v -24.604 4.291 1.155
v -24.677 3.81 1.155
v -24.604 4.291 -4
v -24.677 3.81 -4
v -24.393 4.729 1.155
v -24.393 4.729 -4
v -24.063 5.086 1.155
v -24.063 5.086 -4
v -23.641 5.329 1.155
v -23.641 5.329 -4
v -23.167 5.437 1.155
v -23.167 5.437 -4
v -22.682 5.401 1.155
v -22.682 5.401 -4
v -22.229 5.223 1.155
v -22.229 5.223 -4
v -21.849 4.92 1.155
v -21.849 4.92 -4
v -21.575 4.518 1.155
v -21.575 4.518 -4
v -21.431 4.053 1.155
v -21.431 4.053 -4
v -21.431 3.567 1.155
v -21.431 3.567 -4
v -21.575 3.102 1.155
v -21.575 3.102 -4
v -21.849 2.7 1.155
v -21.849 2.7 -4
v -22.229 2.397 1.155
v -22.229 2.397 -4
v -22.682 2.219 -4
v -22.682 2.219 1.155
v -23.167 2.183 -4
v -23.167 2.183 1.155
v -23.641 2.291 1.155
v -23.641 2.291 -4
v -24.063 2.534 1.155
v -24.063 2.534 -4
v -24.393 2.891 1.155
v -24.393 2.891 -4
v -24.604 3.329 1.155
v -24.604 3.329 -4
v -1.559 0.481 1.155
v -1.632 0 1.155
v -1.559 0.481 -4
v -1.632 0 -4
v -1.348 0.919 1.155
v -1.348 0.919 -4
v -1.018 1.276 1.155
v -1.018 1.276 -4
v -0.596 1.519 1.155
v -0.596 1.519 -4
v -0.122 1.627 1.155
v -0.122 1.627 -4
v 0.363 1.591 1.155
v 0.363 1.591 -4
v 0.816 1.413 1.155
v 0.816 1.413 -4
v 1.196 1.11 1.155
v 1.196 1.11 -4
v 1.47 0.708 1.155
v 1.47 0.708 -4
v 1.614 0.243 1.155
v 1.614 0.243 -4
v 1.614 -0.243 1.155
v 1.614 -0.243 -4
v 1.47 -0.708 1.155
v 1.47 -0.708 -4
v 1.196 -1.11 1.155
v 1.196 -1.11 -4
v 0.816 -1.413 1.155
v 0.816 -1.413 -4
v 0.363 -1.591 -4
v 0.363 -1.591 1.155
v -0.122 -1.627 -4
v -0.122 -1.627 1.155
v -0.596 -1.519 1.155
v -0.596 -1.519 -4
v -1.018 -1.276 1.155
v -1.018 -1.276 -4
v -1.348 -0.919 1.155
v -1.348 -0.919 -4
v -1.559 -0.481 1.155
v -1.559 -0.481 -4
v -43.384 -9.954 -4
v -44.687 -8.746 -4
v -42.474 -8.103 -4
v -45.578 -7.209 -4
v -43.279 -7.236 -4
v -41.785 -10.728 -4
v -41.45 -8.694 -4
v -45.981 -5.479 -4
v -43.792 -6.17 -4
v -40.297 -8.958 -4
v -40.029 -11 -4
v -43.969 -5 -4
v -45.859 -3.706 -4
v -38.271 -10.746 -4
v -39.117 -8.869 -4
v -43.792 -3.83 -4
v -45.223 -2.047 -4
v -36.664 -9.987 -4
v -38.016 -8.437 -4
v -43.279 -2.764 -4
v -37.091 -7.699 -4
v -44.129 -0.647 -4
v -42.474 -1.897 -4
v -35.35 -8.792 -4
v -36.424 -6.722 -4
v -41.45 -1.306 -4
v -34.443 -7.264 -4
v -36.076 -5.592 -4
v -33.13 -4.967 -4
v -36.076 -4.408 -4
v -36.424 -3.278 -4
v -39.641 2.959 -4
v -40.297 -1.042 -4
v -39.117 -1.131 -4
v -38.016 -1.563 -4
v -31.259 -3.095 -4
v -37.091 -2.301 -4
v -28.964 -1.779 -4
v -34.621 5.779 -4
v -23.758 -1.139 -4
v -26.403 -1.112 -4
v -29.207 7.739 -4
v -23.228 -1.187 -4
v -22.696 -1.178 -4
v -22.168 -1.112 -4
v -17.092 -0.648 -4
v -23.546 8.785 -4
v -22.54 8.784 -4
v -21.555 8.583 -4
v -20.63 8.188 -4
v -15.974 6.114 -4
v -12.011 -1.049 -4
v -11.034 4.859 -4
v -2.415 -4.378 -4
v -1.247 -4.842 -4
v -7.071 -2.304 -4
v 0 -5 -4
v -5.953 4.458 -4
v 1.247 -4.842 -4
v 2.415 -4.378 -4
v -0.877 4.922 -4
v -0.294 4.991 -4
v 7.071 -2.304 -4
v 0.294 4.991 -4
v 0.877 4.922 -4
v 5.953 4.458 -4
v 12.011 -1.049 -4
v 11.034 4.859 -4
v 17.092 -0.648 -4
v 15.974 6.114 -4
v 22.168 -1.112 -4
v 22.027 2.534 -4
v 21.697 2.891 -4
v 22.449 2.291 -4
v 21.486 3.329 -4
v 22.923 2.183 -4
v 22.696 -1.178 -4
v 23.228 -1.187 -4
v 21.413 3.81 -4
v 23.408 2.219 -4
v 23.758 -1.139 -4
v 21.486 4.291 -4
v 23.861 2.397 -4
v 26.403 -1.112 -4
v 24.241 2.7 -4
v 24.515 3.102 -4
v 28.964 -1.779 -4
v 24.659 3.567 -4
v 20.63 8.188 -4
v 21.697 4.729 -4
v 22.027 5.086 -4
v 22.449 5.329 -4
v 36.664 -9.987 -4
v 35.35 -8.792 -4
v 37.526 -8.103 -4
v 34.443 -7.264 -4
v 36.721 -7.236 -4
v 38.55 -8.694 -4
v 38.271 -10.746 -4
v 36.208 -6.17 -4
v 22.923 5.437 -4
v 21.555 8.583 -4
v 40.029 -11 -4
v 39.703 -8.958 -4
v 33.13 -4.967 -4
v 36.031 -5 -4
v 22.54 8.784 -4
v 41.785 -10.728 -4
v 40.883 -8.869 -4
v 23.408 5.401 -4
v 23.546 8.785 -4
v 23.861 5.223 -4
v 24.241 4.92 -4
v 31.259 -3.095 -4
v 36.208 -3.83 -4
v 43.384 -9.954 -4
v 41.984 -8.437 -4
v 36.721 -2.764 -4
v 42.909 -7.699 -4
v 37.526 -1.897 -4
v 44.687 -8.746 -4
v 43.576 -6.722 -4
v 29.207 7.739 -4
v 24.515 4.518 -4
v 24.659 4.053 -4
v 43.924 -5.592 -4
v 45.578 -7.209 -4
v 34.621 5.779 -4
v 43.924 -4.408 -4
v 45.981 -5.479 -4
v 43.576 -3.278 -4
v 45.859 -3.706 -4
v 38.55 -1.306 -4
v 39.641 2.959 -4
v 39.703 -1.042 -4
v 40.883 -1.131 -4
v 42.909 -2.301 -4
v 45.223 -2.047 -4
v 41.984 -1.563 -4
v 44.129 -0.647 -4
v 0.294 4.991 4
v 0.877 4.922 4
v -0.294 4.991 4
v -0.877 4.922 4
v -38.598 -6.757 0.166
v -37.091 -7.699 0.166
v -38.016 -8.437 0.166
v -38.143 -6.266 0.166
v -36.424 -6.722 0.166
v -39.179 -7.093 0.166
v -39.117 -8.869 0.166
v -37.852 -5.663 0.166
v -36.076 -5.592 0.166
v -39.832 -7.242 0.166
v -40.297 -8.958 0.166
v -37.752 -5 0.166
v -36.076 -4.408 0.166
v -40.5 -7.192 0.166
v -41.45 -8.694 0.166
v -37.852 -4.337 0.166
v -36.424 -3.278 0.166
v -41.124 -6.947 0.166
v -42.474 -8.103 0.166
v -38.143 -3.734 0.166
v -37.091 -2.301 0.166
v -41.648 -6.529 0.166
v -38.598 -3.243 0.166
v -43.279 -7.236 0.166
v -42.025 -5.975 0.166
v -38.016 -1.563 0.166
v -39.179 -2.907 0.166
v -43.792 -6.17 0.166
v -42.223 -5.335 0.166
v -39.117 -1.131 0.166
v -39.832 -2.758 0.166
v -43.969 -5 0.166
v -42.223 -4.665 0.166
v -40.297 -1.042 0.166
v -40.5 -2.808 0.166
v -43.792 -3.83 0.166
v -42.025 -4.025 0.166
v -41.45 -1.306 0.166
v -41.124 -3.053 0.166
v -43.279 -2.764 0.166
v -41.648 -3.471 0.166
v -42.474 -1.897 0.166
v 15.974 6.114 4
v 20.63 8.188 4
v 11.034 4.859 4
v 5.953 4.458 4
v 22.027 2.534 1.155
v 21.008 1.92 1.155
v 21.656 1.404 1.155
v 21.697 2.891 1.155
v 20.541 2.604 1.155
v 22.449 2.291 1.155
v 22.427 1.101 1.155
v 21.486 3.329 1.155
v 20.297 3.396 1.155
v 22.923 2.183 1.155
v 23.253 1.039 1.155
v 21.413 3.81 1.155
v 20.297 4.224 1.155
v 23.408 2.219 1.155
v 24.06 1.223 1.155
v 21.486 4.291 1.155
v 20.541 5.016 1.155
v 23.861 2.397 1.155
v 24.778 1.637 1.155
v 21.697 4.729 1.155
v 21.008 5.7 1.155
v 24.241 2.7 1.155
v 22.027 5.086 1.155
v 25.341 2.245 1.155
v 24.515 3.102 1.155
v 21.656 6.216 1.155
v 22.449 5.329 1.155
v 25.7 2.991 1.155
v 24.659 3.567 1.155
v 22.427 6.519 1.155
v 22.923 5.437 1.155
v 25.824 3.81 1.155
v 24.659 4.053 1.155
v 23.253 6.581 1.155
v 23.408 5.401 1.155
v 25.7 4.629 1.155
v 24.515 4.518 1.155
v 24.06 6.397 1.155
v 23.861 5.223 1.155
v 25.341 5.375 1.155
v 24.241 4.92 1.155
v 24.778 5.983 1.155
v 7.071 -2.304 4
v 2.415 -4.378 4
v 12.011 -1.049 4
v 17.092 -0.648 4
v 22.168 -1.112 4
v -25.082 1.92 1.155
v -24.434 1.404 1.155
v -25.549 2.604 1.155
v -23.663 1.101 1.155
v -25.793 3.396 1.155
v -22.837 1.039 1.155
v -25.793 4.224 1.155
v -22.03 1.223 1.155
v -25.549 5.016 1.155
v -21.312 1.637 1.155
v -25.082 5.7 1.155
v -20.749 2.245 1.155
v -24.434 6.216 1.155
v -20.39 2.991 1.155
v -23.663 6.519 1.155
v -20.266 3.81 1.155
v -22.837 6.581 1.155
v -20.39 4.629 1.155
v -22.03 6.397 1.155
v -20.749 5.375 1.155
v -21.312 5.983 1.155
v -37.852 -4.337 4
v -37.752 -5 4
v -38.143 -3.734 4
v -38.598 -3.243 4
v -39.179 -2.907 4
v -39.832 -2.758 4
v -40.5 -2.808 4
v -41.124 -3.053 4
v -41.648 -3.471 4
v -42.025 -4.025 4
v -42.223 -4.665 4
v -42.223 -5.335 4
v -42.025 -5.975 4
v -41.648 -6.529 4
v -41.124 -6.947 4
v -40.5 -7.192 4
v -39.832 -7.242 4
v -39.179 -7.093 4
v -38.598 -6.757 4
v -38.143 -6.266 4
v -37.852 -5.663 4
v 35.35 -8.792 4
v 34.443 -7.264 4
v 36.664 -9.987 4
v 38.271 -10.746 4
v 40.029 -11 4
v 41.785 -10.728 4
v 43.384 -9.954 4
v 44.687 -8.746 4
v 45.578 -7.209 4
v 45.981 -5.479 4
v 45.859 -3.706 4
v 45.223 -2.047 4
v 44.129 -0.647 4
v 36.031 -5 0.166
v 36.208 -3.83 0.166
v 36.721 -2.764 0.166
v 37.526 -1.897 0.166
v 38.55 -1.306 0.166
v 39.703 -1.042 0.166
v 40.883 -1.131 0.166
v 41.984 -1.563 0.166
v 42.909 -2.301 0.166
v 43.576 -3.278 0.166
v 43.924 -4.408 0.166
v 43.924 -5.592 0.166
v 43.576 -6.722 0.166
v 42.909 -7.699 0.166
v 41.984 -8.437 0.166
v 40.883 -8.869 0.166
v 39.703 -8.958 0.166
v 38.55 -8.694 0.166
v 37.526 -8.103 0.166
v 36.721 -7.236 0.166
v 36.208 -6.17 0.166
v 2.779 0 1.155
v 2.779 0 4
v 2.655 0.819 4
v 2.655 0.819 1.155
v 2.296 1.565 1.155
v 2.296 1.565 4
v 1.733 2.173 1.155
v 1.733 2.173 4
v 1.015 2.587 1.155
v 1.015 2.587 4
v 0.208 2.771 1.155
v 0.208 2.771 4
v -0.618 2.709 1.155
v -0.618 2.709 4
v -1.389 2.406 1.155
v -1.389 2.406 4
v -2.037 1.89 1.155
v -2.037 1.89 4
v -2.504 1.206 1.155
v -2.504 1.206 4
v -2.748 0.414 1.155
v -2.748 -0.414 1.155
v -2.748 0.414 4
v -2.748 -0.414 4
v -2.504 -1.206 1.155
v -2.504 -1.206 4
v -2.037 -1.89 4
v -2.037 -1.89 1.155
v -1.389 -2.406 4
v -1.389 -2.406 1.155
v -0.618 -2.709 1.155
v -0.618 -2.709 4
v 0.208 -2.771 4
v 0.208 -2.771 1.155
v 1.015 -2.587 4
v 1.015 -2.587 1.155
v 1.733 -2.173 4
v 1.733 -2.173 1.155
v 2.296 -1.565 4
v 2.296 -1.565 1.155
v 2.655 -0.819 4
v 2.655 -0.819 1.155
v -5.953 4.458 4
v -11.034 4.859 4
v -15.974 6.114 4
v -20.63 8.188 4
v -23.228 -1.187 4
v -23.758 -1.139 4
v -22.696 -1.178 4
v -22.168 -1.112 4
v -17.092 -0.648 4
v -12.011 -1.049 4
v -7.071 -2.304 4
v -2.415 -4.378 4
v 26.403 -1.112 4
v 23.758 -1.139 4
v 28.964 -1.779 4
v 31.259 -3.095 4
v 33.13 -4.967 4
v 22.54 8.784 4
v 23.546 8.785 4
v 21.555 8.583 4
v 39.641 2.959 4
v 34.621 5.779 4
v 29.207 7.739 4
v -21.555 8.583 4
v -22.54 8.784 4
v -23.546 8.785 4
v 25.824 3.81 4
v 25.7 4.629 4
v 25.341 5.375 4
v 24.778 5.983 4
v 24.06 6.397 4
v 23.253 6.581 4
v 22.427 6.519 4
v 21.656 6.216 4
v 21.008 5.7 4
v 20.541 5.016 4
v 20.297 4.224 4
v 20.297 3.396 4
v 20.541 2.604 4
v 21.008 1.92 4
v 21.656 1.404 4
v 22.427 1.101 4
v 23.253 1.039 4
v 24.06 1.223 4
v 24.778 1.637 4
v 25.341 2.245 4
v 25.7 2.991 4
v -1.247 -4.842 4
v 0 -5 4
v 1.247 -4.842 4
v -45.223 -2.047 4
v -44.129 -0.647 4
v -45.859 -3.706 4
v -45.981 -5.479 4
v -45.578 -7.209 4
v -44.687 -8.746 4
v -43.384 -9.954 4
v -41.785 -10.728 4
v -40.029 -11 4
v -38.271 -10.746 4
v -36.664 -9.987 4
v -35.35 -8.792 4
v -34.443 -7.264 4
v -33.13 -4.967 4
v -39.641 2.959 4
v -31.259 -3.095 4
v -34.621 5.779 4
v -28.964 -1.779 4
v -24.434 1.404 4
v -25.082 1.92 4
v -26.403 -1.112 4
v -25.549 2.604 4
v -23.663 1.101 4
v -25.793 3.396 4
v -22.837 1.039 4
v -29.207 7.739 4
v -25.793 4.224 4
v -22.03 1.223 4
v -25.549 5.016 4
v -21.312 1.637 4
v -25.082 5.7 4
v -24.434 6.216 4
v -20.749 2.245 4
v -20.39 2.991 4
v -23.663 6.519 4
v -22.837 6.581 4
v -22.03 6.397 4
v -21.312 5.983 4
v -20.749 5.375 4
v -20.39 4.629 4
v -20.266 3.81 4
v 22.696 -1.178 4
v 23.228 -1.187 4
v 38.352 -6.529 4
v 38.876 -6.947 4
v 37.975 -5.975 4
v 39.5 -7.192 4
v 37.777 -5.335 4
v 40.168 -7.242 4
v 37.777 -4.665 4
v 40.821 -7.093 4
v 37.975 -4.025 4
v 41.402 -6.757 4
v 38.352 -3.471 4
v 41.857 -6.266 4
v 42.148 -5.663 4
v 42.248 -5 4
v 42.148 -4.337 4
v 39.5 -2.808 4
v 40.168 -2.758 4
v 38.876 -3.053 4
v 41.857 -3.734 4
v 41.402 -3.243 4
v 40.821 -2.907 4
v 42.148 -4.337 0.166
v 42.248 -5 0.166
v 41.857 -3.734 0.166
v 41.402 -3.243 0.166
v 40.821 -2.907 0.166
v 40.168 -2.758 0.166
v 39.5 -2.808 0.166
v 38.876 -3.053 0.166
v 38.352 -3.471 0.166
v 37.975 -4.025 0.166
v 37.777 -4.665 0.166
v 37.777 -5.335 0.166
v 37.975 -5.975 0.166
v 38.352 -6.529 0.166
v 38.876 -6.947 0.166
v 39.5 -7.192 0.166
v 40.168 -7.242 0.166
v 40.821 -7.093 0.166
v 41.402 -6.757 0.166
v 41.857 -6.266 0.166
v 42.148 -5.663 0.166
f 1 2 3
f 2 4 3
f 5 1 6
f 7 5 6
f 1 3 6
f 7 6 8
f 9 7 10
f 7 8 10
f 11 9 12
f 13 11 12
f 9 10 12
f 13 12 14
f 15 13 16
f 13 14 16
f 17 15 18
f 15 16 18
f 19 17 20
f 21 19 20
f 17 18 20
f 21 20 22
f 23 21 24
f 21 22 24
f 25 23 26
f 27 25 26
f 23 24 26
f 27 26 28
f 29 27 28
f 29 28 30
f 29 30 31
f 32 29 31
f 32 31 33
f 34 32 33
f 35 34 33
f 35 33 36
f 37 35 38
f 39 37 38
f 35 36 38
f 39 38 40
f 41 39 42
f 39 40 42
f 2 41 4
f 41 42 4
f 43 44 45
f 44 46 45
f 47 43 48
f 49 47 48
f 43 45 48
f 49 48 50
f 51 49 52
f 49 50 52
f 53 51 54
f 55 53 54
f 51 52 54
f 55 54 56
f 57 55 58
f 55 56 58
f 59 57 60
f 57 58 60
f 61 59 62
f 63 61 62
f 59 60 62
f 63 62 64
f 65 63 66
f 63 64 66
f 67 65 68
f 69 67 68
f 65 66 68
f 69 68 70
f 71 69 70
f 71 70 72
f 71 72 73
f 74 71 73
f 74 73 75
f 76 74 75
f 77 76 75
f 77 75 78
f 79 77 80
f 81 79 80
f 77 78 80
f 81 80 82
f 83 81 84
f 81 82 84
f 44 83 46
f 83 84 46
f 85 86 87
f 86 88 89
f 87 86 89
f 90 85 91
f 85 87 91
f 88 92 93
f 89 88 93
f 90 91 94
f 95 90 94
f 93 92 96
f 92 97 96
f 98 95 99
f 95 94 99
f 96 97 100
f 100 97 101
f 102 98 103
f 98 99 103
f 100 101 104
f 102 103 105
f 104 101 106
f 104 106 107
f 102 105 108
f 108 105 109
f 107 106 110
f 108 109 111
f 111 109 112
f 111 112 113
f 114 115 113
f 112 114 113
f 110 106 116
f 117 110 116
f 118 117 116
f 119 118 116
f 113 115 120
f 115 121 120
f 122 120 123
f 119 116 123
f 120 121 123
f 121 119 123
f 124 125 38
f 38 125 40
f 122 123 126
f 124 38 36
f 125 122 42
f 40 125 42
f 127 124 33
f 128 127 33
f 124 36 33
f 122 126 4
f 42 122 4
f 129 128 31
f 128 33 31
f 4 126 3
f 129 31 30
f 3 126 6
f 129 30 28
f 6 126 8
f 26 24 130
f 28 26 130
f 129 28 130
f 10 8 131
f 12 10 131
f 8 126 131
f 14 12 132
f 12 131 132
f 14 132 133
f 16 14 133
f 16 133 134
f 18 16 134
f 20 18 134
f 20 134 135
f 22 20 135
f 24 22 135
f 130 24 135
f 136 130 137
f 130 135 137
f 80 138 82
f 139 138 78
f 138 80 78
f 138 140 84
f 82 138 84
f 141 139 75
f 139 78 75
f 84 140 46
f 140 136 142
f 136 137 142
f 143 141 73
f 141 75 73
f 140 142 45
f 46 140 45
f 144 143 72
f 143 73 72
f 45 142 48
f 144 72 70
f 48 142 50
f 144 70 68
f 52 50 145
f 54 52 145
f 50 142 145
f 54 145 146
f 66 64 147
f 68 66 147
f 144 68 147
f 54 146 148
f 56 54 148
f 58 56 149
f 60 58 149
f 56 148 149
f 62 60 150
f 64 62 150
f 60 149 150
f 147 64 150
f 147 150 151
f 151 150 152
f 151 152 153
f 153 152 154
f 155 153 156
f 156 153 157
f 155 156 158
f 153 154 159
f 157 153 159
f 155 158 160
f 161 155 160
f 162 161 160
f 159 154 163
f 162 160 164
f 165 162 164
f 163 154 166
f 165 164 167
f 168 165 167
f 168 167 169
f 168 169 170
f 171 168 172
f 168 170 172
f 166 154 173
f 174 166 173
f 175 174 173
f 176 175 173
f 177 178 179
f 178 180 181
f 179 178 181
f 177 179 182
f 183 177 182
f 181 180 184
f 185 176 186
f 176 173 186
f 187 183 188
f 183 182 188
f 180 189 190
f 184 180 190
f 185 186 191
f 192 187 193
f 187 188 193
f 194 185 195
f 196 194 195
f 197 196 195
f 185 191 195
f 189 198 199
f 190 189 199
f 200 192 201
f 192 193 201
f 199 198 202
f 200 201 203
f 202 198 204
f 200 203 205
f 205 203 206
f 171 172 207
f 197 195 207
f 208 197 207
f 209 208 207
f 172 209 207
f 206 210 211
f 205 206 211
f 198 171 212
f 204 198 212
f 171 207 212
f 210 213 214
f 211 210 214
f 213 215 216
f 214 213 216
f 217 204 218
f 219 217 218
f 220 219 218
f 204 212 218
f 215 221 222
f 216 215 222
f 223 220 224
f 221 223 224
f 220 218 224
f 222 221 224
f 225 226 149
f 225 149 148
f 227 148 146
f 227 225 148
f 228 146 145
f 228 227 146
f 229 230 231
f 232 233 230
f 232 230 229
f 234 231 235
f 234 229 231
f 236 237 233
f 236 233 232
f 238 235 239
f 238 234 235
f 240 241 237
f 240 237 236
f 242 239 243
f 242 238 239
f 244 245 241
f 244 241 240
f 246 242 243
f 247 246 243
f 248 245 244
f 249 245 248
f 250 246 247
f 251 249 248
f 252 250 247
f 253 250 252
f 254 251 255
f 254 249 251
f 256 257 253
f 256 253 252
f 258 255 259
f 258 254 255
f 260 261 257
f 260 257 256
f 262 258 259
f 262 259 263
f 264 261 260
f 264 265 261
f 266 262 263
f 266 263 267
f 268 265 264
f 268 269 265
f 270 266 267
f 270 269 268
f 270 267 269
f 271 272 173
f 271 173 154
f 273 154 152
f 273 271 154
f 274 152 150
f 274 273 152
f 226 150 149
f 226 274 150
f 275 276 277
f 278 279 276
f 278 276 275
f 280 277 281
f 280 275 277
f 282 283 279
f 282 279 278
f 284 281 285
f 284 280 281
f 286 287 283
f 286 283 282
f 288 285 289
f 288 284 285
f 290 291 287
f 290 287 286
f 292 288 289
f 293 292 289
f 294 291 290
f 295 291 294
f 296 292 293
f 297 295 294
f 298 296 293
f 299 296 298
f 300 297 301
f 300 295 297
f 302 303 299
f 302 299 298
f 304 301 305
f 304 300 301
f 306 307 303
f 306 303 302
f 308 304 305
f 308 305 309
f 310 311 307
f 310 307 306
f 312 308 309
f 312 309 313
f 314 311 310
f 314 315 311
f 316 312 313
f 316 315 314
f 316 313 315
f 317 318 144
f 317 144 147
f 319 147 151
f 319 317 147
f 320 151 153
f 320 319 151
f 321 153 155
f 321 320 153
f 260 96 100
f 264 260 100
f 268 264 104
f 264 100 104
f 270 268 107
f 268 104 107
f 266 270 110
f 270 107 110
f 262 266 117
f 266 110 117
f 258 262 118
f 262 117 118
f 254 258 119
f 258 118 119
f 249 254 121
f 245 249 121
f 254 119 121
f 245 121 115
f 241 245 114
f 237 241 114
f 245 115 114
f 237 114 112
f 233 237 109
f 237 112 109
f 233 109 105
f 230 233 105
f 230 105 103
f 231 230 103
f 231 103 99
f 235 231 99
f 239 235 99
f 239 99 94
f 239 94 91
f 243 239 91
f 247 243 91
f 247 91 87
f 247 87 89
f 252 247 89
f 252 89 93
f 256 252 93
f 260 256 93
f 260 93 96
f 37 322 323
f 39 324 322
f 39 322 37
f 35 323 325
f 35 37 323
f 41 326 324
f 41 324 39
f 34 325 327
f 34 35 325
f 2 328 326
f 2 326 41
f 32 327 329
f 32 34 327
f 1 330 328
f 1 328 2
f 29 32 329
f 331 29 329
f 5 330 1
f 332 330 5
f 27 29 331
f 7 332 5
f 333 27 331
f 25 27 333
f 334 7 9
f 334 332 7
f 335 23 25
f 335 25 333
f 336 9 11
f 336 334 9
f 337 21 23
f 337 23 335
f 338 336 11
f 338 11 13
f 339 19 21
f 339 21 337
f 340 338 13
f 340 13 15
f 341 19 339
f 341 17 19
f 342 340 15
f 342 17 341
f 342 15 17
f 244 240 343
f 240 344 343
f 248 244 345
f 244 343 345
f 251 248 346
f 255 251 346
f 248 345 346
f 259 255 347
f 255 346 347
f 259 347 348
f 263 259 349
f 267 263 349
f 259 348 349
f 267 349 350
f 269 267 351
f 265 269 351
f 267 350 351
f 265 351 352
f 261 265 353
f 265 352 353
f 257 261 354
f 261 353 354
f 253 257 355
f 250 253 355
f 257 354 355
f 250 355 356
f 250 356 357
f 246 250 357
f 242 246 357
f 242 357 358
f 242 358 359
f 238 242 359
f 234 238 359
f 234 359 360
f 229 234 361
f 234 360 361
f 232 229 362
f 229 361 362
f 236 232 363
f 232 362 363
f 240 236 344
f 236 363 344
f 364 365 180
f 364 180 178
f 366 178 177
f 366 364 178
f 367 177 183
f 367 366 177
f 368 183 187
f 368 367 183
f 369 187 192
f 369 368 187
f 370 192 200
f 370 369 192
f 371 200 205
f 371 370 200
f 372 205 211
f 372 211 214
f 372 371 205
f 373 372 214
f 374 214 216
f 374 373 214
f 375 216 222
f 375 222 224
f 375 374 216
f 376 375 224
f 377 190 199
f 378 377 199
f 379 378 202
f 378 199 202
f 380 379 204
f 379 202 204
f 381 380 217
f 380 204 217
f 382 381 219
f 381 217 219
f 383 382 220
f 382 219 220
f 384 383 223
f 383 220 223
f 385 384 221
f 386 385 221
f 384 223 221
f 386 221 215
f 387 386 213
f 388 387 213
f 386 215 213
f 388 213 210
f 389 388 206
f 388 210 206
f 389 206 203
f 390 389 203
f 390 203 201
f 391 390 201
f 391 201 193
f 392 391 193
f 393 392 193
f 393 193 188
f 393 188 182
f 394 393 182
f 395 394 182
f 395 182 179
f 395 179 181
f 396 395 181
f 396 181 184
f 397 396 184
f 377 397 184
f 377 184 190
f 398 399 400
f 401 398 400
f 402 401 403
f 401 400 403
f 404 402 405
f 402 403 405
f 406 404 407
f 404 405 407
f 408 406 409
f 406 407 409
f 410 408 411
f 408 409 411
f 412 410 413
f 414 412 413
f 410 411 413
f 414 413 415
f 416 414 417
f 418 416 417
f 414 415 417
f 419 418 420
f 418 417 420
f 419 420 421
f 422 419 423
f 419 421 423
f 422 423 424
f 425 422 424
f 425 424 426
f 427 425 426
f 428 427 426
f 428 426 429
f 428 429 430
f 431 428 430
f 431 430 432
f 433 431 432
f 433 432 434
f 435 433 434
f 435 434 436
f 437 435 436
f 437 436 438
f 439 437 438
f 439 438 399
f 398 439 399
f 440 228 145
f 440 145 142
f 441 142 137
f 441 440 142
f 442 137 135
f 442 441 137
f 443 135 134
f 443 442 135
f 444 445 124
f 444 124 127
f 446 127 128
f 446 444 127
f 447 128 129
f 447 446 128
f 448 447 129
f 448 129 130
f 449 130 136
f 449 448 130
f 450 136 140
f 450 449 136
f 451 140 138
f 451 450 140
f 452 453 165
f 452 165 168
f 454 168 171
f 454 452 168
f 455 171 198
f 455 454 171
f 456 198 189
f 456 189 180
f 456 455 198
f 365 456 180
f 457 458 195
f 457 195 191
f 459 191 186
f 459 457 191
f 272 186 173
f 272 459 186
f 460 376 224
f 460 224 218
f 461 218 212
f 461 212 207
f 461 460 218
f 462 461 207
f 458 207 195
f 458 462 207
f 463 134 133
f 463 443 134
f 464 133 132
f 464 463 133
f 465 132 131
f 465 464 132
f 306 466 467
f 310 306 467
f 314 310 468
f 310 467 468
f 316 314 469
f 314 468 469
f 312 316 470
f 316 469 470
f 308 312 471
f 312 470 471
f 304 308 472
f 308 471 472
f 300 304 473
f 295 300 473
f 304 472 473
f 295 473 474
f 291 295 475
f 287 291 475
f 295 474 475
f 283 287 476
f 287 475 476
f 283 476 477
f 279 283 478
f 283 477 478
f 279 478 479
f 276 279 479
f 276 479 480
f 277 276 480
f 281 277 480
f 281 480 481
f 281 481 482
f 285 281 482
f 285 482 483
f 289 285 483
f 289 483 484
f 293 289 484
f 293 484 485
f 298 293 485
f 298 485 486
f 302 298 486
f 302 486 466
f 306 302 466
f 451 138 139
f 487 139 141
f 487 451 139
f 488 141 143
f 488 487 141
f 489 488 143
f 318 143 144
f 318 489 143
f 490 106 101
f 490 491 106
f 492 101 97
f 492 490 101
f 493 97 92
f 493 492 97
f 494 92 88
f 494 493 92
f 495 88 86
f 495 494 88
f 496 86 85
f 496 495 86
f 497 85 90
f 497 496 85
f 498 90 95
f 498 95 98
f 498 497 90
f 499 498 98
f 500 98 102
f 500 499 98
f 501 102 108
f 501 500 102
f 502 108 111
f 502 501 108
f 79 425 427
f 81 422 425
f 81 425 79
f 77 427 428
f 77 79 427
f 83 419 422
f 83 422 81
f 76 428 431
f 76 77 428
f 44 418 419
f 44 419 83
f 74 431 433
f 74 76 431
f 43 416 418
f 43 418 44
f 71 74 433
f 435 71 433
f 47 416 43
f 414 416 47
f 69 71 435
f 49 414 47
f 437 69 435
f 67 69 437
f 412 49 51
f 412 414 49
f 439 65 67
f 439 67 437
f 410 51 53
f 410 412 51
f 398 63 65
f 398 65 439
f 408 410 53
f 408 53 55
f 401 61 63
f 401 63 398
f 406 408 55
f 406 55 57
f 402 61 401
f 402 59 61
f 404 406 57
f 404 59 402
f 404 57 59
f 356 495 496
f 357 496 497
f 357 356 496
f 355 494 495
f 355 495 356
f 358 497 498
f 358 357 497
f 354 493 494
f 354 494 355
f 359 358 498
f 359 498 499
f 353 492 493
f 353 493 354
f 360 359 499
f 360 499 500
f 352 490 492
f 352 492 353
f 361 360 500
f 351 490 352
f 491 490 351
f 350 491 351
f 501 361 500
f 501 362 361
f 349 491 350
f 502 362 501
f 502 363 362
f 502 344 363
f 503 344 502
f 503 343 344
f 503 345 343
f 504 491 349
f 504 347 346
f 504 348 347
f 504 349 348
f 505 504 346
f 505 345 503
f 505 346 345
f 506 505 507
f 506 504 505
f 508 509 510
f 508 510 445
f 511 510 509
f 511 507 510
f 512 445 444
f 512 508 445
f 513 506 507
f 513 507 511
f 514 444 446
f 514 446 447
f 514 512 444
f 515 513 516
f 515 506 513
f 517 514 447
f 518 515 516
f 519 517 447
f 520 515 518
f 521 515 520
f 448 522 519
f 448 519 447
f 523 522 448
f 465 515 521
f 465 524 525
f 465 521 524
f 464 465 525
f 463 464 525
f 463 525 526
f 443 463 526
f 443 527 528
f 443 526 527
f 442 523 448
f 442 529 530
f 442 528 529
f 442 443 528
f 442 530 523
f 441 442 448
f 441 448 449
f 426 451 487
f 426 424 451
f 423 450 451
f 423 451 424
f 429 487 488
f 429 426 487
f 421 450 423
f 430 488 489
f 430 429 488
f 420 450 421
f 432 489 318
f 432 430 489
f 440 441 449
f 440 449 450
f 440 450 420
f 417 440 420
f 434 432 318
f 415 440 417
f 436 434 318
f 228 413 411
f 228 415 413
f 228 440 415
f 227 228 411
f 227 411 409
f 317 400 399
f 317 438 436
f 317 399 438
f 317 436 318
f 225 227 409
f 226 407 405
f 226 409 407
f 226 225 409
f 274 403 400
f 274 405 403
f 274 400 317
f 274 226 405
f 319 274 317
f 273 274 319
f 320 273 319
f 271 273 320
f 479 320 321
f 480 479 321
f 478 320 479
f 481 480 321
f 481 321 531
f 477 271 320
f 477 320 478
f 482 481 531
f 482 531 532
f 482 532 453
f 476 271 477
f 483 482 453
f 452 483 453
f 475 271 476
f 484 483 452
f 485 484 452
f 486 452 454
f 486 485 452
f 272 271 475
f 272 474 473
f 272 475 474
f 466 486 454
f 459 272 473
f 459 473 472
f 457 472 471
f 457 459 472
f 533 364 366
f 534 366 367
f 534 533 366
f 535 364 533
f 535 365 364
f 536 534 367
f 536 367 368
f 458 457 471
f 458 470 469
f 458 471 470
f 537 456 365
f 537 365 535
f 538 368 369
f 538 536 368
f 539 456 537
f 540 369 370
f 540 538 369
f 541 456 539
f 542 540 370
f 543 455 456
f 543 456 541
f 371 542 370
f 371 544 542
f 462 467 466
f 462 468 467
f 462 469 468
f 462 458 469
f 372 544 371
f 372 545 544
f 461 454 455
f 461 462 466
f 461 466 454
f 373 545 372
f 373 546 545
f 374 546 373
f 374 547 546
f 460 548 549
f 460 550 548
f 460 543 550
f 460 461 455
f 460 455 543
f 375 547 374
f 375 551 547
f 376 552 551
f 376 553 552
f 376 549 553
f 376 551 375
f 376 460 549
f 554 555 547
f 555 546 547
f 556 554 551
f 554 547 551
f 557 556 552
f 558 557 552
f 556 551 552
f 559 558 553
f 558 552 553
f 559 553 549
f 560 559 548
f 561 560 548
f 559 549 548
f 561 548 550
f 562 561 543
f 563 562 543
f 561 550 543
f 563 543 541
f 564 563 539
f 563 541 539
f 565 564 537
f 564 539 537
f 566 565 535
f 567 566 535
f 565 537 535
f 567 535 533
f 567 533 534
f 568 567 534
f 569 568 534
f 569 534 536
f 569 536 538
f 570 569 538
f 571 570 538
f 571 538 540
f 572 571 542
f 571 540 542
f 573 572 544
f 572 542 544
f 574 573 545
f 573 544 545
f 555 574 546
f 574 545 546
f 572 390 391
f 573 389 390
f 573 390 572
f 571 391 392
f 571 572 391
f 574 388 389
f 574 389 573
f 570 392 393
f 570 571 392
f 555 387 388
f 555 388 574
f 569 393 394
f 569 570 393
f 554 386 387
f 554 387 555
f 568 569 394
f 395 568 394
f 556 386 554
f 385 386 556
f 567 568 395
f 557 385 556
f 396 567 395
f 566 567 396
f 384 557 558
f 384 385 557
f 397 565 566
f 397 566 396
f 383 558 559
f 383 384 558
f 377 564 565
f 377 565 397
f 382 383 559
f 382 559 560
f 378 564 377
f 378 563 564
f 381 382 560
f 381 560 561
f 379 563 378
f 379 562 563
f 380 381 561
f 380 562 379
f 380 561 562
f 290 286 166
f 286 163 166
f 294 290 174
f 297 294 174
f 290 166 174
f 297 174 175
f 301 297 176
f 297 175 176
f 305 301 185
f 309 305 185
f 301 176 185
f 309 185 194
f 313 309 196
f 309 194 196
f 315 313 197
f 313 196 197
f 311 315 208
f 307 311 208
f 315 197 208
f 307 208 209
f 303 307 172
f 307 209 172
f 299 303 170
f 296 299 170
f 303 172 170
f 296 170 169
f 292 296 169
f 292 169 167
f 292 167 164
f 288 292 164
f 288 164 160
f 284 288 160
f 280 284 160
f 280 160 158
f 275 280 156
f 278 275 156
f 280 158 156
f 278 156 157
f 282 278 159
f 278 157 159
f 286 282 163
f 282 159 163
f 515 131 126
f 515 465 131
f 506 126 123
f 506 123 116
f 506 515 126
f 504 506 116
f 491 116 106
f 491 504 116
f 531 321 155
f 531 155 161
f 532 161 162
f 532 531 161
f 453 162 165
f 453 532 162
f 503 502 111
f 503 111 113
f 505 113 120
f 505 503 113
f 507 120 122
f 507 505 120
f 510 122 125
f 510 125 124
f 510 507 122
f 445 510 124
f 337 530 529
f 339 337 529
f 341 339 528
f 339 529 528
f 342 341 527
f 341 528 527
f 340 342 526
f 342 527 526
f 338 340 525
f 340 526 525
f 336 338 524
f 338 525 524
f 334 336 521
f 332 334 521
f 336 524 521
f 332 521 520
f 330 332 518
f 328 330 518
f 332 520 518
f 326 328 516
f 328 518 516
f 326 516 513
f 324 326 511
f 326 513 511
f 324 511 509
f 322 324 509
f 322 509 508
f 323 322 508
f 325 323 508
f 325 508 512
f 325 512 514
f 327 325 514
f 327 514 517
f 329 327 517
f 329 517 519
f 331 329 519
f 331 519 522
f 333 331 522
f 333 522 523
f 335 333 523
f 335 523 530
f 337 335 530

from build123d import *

# Parameters (mm, degrees)
BOSS_EXTRUDE1_DEPTH                            = 4
CBORE_FOR_4_SOCKET_HEAD_CAP_SCREW1_D           = 3.2639
CBORE_FOR_4_SOCKET_HEAD_CAP_SCREW1_DEPTH       = 9.019425513
CBORE_FOR_4_SOCKET_HEAD_CAP_SCREW1_CBORE_D     = 5.55752
CBORE_FOR_4_SOCKET_HEAD_CAP_SCREW1_CBORE_DEPTH = 2.8448
CBORE_FOR_4_SOCKET_HEAD_CAP_SCREW1_TIP         = 0.980574487
CBORE_FOR_8_SOCKET_HEAD_CAP_SCREW1_D           = 4.4958
CBORE_FOR_8_SOCKET_HEAD_CAP_SCREW1_DEPTH       = 8.649325414
CBORE_FOR_8_SOCKET_HEAD_CAP_SCREW1_CBORE_D     = 7.9375
CBORE_FOR_8_SOCKET_HEAD_CAP_SCREW1_CBORE_DEPTH = 4.1656
CBORE_FOR_8_SOCKET_HEAD_CAP_SCREW1_TIP         = 1.350674586


with BuildPart() as part:
    # Sketch1 → Boss-Extrude1 (new body, symmetric)
    with BuildSketch(Plane.XY):
        with BuildLine():
            ThreePointArc((-44.12938743, -0.647051637), (-43.384473284, -9.954325443), (-34.443470177, -7.263841056))
            ThreePointArc((-34.443470177, -7.263841056), (-30.155368055, -2.36099743), (-23.757529046, -1.138969828))
            ThreePointArc((-23.757529046, -1.138969828), (-22.961581659, -1.18930409), (-22.167756654, -1.112442901))
            ThreePointArc((-22.167756654, -1.112442901), (-12.010862121, -1.048885846), (-2.414899511, -4.378157187))
            ThreePointArc((-2.414899511, -4.378157187), (0, -5), (2.414899511, -4.378157187))
            ThreePointArc((2.414899511, -4.378157187), (12.010862121, -1.048885846), (22.167756654, -1.112442901))
            ThreePointArc((22.167756654, -1.112442901), (22.961581659, -1.18930409), (23.757529046, -1.138969828))
            ThreePointArc((23.757529046, -1.138969828), (30.155368055, -2.36099743), (34.443470177, -7.263841056))
            ThreePointArc((34.443470177, -7.263841056), (43.384473284, -9.954325443), (44.12938743, -0.647051637))
            ThreePointArc((44.12938743, -0.647051637), (34.621269329, 5.779365543), (23.545617652, 8.78487507))
            ThreePointArc((23.545617652, 8.78487507), (22.042434881, 8.708455183), (20.630100489, 8.188157187))
            ThreePointArc((20.630100489, 8.188157187), (11.034137879, 4.858885846), (0.877243346, 4.922442901))
            ThreePointArc((0.877243346, 4.922442901), (0, 5), (-0.877243346, 4.922442901))
            ThreePointArc((-0.877243346, 4.922442901), (-11.034137879, 4.858885846), (-20.630100489, 8.188157187))
            ThreePointArc((-20.630100489, 8.188157187), (-22.042434881, 8.708455183), (-23.545617652, 8.78487507))
            ThreePointArc((-23.545617652, 8.78487507), (-34.621269329, 5.779365543), (-44.12938743, -0.647051637))
        make_face()
    extrude(amount=BOSS_EXTRUDE1_DEPTH, both=True)

    # CBORE for #4 Socket Head Cap Screw1
    with Locations(Plane.XY.offset(4)):
        with Locations((-23.045, 3.81), (0, 0), (23.045, 3.81)):
            CounterBoreHole(CBORE_FOR_4_SOCKET_HEAD_CAP_SCREW1_D / 2, CBORE_FOR_4_SOCKET_HEAD_CAP_SCREW1_CBORE_D / 2, CBORE_FOR_4_SOCKET_HEAD_CAP_SCREW1_CBORE_DEPTH, depth=CBORE_FOR_4_SOCKET_HEAD_CAP_SCREW1_DEPTH)
            with Locations((0, 0, -(CBORE_FOR_4_SOCKET_HEAD_CAP_SCREW1_DEPTH + CBORE_FOR_4_SOCKET_HEAD_CAP_SCREW1_TIP / 2))):  # 118° drill point
                Cone(0, CBORE_FOR_4_SOCKET_HEAD_CAP_SCREW1_D / 2, CBORE_FOR_4_SOCKET_HEAD_CAP_SCREW1_TIP, mode=Mode.SUBTRACT)

    # CBORE for #8 Socket Head Cap Screw1
    with Locations(Plane(origin=(0, 0, -4), x_dir=(-1, 0, 0), z_dir=(0, 0, -1))):
        with Locations((-40, -5), (40, -5)):
            CounterBoreHole(CBORE_FOR_8_SOCKET_HEAD_CAP_SCREW1_D / 2, CBORE_FOR_8_SOCKET_HEAD_CAP_SCREW1_CBORE_D / 2, CBORE_FOR_8_SOCKET_HEAD_CAP_SCREW1_CBORE_DEPTH, depth=CBORE_FOR_8_SOCKET_HEAD_CAP_SCREW1_DEPTH)
            with Locations((0, 0, -(CBORE_FOR_8_SOCKET_HEAD_CAP_SCREW1_DEPTH + CBORE_FOR_8_SOCKET_HEAD_CAP_SCREW1_TIP / 2))):  # 118° drill point
                Cone(0, CBORE_FOR_8_SOCKET_HEAD_CAP_SCREW1_D / 2, CBORE_FOR_8_SOCKET_HEAD_CAP_SCREW1_TIP, mode=Mode.SUBTRACT)


solid = part.part
